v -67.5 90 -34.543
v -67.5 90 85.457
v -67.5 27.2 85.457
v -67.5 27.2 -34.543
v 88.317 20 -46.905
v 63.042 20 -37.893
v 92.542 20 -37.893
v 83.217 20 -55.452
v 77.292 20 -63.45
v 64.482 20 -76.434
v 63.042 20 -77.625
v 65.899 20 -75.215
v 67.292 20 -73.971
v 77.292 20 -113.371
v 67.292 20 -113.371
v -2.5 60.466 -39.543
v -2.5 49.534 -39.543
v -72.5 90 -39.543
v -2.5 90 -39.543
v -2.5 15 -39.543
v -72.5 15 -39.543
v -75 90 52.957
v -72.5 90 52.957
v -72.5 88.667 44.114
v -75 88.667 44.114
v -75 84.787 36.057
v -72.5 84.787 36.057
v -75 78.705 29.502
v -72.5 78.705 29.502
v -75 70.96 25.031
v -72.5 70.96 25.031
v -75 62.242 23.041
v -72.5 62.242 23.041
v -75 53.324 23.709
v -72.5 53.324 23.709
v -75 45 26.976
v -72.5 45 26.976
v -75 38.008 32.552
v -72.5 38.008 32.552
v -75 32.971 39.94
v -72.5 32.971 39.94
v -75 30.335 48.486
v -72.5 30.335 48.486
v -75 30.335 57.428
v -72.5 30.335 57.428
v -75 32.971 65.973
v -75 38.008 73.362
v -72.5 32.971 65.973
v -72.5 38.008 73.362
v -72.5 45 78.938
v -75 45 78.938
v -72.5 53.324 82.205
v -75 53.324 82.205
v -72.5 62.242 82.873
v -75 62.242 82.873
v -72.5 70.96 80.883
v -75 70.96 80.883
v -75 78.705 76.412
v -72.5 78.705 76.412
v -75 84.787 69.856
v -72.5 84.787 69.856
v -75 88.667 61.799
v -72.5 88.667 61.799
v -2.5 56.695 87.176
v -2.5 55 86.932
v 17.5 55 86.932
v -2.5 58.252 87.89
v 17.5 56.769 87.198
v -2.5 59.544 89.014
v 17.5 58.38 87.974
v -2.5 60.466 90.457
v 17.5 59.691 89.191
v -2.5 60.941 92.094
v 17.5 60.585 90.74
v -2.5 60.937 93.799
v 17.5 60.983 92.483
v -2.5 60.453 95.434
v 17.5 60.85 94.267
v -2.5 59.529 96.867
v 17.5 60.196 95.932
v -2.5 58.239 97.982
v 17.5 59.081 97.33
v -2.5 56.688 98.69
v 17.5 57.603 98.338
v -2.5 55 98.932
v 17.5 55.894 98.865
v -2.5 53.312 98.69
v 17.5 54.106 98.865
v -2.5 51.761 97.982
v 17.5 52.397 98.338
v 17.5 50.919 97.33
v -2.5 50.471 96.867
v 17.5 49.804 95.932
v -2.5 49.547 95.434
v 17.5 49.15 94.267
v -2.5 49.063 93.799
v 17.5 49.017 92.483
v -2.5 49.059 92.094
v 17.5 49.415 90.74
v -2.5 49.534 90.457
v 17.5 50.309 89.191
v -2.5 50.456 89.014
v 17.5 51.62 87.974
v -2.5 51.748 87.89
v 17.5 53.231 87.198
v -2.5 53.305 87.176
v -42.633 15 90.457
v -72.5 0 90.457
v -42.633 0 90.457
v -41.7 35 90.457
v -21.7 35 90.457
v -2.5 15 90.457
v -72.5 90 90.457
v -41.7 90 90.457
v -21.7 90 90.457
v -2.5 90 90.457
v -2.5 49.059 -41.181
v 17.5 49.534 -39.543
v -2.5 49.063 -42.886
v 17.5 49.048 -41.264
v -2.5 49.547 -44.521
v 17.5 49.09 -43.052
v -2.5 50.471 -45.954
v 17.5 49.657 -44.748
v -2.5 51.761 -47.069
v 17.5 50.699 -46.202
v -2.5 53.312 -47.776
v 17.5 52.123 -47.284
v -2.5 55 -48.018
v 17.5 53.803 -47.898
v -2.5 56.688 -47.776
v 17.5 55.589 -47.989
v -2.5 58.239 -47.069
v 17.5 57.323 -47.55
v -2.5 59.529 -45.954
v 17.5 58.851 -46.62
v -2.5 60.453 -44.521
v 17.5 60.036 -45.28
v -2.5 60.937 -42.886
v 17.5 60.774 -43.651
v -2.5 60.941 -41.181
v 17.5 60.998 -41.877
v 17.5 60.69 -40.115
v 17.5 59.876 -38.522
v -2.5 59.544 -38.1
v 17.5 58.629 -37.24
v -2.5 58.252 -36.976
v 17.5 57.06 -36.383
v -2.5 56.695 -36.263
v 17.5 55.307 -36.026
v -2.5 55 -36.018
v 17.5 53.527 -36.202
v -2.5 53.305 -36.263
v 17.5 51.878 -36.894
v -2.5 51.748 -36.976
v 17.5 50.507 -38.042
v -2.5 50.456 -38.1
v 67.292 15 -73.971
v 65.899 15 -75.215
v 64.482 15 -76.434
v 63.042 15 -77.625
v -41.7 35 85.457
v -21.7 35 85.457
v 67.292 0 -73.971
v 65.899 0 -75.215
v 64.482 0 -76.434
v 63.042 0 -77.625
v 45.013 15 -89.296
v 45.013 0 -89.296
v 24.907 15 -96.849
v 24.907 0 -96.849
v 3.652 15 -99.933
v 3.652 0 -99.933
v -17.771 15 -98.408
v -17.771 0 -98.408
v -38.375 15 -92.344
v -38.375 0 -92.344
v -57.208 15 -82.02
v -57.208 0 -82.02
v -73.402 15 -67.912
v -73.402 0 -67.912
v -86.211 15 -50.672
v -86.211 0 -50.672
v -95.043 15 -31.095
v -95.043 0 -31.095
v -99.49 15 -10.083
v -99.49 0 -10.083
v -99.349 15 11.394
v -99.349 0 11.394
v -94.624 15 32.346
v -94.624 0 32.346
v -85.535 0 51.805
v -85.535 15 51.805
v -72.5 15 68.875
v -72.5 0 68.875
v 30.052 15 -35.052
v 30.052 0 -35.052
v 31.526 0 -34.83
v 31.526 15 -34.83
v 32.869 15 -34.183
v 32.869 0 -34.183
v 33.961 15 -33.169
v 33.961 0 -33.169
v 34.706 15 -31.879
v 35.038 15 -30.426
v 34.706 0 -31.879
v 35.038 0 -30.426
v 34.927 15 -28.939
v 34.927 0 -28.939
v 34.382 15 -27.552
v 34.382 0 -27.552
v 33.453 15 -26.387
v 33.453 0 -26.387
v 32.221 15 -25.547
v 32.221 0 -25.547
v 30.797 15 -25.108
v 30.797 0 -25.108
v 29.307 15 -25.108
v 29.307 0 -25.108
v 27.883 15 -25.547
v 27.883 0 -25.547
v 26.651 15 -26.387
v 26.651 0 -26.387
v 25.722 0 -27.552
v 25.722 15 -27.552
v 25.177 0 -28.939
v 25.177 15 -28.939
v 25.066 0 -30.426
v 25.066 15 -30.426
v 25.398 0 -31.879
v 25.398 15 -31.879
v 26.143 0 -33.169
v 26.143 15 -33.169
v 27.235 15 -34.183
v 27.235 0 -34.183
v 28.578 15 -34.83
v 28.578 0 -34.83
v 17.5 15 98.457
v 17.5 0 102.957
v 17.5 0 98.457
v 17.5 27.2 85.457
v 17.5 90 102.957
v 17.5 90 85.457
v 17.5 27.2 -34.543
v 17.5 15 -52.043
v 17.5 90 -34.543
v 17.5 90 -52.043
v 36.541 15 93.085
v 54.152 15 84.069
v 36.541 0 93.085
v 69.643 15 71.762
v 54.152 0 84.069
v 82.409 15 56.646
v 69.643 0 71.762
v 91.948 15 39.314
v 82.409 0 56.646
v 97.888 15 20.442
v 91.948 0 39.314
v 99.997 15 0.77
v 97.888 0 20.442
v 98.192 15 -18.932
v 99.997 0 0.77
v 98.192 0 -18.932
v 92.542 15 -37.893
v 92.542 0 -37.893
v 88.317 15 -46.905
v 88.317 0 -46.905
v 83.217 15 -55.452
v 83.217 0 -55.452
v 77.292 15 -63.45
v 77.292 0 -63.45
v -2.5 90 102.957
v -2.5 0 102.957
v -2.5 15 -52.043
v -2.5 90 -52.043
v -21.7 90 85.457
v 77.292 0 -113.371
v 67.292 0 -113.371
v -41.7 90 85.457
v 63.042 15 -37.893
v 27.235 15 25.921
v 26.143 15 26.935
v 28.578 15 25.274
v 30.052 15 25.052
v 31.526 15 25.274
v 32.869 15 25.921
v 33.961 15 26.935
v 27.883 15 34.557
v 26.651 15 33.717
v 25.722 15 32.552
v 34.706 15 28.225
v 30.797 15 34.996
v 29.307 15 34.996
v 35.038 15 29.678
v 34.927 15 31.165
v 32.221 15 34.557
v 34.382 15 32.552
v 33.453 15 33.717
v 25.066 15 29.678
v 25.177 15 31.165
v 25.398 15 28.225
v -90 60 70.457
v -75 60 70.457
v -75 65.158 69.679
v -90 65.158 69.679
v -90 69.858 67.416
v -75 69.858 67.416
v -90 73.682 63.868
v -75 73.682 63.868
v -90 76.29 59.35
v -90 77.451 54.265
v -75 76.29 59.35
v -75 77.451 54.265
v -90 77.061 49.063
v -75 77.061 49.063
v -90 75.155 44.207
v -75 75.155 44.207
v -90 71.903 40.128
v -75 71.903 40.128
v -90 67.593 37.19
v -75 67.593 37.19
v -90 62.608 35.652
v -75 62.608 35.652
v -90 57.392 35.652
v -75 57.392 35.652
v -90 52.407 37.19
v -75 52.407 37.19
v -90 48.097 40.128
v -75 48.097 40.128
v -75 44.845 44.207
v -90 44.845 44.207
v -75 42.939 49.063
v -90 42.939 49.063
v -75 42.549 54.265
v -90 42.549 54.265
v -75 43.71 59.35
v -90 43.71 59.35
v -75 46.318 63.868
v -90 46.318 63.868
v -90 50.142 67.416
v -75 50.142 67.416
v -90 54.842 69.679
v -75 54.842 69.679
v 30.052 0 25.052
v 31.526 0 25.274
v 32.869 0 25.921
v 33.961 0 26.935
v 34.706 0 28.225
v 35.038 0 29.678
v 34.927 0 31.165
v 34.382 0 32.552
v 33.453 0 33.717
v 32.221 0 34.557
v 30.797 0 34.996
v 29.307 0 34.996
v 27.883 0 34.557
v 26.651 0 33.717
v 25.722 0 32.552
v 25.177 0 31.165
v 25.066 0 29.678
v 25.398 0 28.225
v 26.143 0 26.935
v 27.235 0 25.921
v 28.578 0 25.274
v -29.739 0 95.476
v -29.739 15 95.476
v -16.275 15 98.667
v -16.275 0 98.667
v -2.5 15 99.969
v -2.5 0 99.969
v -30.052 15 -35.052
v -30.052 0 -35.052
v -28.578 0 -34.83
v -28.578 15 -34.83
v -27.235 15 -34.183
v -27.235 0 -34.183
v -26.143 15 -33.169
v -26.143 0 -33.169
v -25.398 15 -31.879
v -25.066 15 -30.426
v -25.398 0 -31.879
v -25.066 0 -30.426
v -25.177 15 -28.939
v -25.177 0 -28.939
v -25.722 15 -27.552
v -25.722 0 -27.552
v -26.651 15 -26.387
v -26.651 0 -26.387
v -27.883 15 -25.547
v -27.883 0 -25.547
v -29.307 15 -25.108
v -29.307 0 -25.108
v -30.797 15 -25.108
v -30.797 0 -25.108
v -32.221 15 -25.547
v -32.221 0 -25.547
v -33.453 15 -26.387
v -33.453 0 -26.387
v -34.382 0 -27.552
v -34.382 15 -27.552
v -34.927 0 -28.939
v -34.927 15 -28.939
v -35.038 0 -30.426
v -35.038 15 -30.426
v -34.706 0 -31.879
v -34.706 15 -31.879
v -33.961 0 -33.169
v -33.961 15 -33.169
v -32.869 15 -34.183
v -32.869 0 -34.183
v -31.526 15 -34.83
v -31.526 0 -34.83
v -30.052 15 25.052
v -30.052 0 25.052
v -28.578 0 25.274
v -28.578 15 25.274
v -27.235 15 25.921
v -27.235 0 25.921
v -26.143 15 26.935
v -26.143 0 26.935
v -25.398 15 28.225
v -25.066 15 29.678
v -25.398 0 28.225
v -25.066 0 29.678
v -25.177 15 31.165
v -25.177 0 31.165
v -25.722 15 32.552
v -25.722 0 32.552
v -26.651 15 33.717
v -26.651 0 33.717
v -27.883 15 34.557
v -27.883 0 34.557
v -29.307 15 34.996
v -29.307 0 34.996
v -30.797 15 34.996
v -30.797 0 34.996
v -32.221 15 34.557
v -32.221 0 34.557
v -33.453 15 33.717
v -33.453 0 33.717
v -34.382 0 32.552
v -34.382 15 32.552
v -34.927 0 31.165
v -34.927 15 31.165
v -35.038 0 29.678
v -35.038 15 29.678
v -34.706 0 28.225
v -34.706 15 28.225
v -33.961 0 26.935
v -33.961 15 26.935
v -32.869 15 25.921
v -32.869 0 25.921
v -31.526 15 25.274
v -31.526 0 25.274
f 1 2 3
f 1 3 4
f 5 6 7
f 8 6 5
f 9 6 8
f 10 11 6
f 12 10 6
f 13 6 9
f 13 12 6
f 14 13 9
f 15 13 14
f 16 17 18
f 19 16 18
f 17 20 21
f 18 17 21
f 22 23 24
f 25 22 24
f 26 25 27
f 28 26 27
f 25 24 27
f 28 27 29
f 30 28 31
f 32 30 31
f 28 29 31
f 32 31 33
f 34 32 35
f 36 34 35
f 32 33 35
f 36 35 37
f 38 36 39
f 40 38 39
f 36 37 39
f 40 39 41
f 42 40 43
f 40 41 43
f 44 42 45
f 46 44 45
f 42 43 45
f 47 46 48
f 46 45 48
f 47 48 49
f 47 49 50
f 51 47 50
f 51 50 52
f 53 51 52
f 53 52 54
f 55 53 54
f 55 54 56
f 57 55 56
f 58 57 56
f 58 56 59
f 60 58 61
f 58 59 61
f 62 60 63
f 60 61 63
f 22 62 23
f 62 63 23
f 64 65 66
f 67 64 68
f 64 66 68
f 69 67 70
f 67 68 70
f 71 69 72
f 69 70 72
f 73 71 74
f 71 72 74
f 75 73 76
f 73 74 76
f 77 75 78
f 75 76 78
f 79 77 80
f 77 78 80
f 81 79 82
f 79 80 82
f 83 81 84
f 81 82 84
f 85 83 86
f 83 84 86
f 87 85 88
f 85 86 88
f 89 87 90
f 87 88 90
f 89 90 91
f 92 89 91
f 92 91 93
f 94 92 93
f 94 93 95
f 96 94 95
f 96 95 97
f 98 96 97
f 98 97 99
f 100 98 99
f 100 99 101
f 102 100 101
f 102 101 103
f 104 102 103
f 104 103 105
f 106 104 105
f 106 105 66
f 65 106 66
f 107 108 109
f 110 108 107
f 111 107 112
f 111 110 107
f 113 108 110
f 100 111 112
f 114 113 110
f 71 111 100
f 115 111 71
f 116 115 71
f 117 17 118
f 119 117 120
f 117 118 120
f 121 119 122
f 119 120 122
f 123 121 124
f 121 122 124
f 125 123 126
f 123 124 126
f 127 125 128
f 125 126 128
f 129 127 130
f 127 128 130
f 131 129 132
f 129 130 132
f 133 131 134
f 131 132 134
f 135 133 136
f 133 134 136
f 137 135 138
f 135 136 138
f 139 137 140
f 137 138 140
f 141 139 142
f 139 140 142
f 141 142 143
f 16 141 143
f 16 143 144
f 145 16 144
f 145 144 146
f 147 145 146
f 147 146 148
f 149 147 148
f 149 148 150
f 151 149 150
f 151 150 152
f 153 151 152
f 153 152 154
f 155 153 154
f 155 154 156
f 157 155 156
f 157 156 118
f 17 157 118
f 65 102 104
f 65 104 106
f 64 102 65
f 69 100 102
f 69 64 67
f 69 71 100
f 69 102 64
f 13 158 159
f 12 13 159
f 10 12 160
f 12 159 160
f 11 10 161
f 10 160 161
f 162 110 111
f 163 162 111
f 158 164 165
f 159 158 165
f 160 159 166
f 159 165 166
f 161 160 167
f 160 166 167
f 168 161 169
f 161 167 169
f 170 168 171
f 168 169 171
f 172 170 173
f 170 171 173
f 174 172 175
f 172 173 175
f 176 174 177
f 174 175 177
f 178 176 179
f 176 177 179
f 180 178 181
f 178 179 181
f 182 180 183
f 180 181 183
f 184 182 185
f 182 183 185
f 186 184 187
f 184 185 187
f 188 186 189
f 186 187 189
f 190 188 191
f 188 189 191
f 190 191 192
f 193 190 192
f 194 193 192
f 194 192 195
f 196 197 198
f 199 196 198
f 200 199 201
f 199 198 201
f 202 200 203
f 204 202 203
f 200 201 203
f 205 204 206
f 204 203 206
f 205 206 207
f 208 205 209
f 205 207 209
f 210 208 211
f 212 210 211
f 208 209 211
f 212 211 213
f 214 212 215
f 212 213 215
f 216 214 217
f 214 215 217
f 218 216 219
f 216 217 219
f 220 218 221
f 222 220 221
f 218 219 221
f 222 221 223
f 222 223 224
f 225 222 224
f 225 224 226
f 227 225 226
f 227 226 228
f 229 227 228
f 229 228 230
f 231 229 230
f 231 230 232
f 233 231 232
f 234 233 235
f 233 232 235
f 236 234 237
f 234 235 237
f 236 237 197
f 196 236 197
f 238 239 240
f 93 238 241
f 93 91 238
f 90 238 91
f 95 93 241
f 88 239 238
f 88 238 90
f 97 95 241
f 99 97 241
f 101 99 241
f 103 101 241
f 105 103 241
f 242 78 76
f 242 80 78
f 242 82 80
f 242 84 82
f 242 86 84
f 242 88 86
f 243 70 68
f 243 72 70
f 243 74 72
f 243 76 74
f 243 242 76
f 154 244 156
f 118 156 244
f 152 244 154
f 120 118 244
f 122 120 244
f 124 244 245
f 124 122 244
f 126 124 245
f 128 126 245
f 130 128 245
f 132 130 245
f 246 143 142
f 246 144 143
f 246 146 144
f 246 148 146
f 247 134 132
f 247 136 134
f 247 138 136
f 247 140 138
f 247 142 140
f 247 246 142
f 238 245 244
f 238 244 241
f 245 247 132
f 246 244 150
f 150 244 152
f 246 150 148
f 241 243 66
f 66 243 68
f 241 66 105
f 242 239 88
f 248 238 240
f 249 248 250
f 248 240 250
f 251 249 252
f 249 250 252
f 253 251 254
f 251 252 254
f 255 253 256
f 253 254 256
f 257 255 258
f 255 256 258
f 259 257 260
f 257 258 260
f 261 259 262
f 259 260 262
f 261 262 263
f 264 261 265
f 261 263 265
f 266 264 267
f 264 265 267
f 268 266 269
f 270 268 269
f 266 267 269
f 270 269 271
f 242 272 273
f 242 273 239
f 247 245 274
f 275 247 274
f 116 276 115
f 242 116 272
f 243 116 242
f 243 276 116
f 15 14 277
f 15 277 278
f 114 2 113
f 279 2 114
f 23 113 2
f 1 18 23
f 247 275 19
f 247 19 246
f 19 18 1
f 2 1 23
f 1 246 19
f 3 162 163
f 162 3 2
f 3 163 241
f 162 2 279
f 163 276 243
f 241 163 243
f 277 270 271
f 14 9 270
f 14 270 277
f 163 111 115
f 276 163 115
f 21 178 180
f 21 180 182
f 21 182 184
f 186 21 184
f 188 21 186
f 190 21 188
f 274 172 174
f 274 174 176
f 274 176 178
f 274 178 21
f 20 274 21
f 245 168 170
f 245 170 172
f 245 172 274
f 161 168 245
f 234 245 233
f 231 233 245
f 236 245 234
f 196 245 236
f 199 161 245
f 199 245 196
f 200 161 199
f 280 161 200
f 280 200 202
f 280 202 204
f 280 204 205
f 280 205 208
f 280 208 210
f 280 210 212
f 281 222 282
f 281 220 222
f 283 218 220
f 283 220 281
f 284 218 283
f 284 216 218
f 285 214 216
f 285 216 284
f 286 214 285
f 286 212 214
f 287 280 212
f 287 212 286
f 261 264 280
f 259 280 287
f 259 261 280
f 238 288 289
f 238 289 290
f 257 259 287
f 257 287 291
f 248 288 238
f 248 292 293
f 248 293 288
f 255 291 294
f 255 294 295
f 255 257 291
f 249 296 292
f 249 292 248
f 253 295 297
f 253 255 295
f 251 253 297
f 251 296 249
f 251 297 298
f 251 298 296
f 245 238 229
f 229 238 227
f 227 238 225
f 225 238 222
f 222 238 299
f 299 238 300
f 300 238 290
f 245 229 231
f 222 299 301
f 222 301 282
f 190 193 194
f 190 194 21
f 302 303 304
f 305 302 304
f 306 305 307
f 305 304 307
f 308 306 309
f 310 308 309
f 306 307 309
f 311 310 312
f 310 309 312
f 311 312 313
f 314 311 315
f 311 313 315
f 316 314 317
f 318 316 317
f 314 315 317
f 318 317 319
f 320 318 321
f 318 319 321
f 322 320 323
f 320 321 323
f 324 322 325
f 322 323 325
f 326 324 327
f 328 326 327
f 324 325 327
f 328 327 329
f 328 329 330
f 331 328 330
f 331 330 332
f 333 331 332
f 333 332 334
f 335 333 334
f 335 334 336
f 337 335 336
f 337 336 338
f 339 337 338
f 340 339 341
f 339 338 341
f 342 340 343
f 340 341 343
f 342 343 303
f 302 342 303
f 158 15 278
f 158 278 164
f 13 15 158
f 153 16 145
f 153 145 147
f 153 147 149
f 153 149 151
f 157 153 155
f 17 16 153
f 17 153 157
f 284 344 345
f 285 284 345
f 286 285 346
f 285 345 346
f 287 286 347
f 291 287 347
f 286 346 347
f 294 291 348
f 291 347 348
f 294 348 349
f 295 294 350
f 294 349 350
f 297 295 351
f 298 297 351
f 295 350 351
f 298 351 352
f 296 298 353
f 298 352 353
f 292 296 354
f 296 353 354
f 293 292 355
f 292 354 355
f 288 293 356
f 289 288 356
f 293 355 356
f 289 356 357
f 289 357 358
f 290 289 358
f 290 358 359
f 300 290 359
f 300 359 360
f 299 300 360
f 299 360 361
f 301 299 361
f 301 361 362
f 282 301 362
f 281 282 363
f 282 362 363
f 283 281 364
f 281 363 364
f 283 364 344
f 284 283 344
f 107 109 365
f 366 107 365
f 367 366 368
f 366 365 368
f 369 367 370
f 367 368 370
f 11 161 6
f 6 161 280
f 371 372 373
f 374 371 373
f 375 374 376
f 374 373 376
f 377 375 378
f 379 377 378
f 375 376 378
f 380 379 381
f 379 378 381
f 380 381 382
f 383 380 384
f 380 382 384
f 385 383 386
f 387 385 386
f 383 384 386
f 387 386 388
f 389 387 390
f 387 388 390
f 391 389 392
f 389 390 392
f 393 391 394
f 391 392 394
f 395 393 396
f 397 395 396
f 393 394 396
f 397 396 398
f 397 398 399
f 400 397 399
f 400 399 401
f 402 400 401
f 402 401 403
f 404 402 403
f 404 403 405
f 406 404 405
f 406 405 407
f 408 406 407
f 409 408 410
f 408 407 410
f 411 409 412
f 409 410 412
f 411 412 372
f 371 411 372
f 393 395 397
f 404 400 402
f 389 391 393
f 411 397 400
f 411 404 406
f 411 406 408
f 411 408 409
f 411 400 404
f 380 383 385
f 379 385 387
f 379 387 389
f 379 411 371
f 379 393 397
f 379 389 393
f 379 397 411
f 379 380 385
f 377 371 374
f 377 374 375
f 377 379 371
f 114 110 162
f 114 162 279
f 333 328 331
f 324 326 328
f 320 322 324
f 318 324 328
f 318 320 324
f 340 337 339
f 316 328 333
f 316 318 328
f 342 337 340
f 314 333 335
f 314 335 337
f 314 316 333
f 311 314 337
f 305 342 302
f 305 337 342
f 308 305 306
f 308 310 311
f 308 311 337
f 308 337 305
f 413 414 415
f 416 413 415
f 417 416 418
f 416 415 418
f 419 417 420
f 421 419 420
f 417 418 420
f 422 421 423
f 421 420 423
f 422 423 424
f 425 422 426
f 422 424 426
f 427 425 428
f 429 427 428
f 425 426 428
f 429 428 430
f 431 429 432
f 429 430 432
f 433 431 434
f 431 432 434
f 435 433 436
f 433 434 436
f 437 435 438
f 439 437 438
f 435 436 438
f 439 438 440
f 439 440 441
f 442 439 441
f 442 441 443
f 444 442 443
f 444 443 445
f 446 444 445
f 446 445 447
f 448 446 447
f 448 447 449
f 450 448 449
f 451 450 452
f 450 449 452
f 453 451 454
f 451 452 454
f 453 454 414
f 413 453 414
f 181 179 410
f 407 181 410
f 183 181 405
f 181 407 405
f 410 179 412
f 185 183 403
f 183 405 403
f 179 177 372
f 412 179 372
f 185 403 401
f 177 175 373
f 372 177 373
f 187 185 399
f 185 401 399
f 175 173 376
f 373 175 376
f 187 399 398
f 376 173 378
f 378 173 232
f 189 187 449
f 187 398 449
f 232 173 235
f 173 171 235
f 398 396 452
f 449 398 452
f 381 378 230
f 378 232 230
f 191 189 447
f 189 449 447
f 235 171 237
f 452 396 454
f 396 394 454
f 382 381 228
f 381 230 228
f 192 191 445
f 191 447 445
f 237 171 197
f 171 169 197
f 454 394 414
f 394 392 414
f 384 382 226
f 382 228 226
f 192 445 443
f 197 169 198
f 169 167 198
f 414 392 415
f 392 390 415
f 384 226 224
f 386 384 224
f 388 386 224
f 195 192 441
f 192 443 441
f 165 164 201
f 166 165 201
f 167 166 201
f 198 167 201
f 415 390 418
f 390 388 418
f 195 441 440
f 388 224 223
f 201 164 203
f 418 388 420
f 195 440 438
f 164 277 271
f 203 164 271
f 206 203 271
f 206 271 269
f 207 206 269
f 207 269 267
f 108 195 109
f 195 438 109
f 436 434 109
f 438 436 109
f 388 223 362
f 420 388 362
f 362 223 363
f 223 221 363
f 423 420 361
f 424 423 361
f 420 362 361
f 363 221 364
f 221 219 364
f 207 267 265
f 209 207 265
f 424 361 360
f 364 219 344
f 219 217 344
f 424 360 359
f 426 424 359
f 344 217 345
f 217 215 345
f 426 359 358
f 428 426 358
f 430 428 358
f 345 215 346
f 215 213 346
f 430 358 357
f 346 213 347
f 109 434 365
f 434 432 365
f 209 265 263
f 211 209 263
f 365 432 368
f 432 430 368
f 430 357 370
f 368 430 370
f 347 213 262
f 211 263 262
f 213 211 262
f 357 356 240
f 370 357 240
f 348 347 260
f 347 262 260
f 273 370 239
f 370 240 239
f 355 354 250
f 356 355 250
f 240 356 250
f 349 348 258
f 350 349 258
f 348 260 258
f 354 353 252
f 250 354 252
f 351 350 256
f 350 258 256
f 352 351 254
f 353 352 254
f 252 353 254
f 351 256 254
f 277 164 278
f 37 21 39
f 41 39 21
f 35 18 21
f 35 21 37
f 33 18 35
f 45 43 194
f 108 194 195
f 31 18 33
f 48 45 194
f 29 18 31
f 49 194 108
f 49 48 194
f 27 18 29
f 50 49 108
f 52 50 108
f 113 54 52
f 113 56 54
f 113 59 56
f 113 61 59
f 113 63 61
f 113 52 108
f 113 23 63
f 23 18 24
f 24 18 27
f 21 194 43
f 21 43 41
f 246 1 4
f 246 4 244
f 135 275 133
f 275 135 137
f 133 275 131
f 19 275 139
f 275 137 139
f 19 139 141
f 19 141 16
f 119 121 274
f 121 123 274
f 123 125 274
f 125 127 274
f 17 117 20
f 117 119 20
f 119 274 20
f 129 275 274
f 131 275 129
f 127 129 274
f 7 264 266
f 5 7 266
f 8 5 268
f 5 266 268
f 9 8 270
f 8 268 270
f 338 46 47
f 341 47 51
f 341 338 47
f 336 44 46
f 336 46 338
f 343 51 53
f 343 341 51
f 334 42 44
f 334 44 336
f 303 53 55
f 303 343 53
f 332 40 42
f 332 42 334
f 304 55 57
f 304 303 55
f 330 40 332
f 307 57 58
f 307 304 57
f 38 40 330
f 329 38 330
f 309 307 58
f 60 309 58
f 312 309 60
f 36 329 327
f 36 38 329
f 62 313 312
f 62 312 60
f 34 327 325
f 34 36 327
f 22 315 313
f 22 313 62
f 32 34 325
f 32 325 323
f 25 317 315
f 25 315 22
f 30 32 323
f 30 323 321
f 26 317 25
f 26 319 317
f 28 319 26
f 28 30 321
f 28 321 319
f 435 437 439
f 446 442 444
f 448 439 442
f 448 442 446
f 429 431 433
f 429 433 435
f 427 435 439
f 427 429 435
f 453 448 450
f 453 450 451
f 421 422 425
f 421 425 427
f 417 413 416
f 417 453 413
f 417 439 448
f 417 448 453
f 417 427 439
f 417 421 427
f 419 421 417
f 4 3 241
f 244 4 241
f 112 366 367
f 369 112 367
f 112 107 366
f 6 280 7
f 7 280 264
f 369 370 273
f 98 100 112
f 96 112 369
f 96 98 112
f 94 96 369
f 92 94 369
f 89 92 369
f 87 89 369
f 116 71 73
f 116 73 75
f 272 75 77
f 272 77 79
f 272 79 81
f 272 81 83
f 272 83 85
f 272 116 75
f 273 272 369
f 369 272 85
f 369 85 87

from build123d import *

# Parameters (mm, degrees)
SKETCH1_R                       = 100
BOSS_EXTRUDE1_DEPTH             = 15
BOSS_EXTRUDE2_DEPTH             = 75
BOSS_EXTRUDE2_DIRECTION_2_REACH = 144.215
SKETCH3_W                       = 85
SKETCH3_H                       = 120
CUT_EXTRUDE1_DEPTH              = 62.8
SKETCH4_W                       = 20
SKETCH4_H                       = 55
CUT_EXTRUDE2_DEPTH              = 5
SKETCH5_R                       = 30
BOSS_EXTRUDE3_DEPTH             = 2.5
SKETCH6_R                       = 17.5
BOSS_EXTRUDE4_DEPTH             = 15
BOSS_EXTRUDE5_DEPTH             = 5
BOSS_EXTRUDE5_DIRECTION_2_REACH = 163.942
SKETCH8_R                       = 6
CUT_EXTRUDE3_DEPTH              = 20
SKETCH11_R                      = 5
CUT_EXTRUDE4_DEPTH              = 15


with BuildPart() as part:
    # Sketch1 → Boss-Extrude1 (new body)
    with BuildSketch(Plane(origin=(0, 0, 0), x_dir=(1, 0, 0), z_dir=(0, 1, 0))):
        with Locations(Location((0, 0, 0), (0, 0, 270))):
            Circle(SKETCH1_R)
    extrude(amount=BOSS_EXTRUDE1_DEPTH)

    # Sketch2 → Boss-Extrude2 (add)
    with BuildSketch(Plane(origin=(0, 15, 0), x_dir=(1, 0, 0), z_dir=(0, 1, 0))):
        Polygon((-2.5, 52.043156662), (-2.5, 39.543156662), (-72.5, 39.543156662), (-72.5, -90.456843338), (-2.5, -90.456843338), (-2.5, -102.956843338), (17.5, -102.956843338), (17.5, 52.043156662), align=None)
    extrude(amount=BOSS_EXTRUDE2_DEPTH)

    # Boss-Extrude2 direction 2: up to this face of the body (flat: up to its plane)
    boss_extrude2_direction_2_end = Plane(part.part.faces().sort_by_distance((0, 0, 0))[0])
    # Sketch2 → Boss-Extrude2 direction 2 (add, up to the picked face)
    with BuildSketch(Plane(origin=(0, 15, 0), x_dir=(1, 0, 0), z_dir=(0, 1, 0)), mode=Mode.PRIVATE) as boss_extrude2_direction_2_sk1:
        Polygon((-2.5, 52.043156662), (-2.5, 39.543156662), (-72.5, 39.543156662), (-72.5, -90.456843338), (-2.5, -90.456843338), (-2.5, -102.956843338), (17.5, -102.956843338), (17.5, 52.043156662), align=None)
    boss_extrude2_direction_2_tool1 = split(extrude(boss_extrude2_direction_2_sk1.sketch, amount=-BOSS_EXTRUDE2_DIRECTION_2_REACH, mode=Mode.PRIVATE), bisect_by=boss_extrude2_direction_2_end, keep=Keep.BOTH, mode=Mode.PRIVATE)
    add(boss_extrude2_direction_2_tool1.solids().sort_by(Axis((-26.065574, 15, 25.456843), (0, -1, 0)))[0])

    # Sketch3 → Cut-Extrude1 (cut)
    with BuildSketch(Plane(origin=(0, 90, 0), x_dir=(1, 0, 0), z_dir=(0, 1, 0))):
        with Locations((-25, -25.456843338)):
            Rectangle(SKETCH3_W, SKETCH3_H)
    extrude(amount=-CUT_EXTRUDE1_DEPTH, mode=Mode.SUBTRACT)

    # Sketch4 → Cut-Extrude2 (cut)
    with BuildSketch(Plane.XY.offset(90.456843338)):
        with Locations((-31.7, 62.5)):
            Rectangle(SKETCH4_W, SKETCH4_H)
    extrude(amount=-CUT_EXTRUDE2_DEPTH, mode=Mode.SUBTRACT)

    # Sketch5 → Boss-Extrude3 (add)
    with BuildSketch(Plane.ZY.offset(72.5)):
        with Locations(Location((52.956843338, 60, 0), (0, 0, 90))):
            Circle(SKETCH5_R)
    extrude(amount=BOSS_EXTRUDE3_DEPTH)

    # Sketch6 → Boss-Extrude4 (add)
    with BuildSketch(Plane.ZY.offset(75)):
        with Locations((52.956843338, 60)):
            Circle(SKETCH6_R)
    extrude(amount=BOSS_EXTRUDE4_DEPTH)

    # Sketch7 → Boss-Extrude5 (add)
    with BuildSketch(Plane(origin=(0, 15, 0), x_dir=(1, 0, 0), z_dir=(0, 1, 0))):
        with BuildLine():
            Line((63.042469592, 37.893156662), (92.542469592, 37.893156662))
            ThreePointArc((92.542469592, 37.893156662), (85.873522386, 51.24195696), (77.292469592, 63.449776551))
            Line((77.292469592, 63.449776551), (77.292469592, 113.371099331))
            Line((77.292469592, 113.371099331), (67.292469592, 113.371099331))
            Line((67.292469592, 113.371099331), (67.292469592, 73.971099331))
            ThreePointArc((67.292469592, 73.971099331), (65.19307414, 75.827851639), (63.042469592, 77.625041242))
            Line((63.042469592, 77.625041242), (63.042469592, 37.893156662))
        make_face()
    extrude(amount=BOSS_EXTRUDE5_DEPTH)

    # Boss-Extrude5 direction 2: up to this face of the body (flat: up to its plane)
    boss_extrude5_direction_2_end = Plane(part.part.faces().sort_by_distance((-0.54005377, 0, 0.955561691))[0])
    # Sketch7 → Boss-Extrude5 direction 2 (add, up to the picked face)
    with BuildSketch(Plane(origin=(0, 15, 0), x_dir=(1, 0, 0), z_dir=(0, 1, 0)), mode=Mode.PRIVATE) as boss_extrude5_direction_2_sk1:
        with BuildLine():
            Line((63.042469592, 37.893156662), (92.542469592, 37.893156662))
            ThreePointArc((92.542469592, 37.893156662), (85.873522386, 51.24195696), (77.292469592, 63.449776551))
            Line((77.292469592, 63.449776551), (77.292469592, 113.371099331))
            Line((77.292469592, 113.371099331), (67.292469592, 113.371099331))
            Line((67.292469592, 113.371099331), (67.292469592, 73.971099331))
            ThreePointArc((67.292469592, 73.971099331), (65.19307414, 75.827851639), (63.042469592, 77.625041242))
            Line((63.042469592, 77.625041242), (63.042469592, 37.893156662))
        make_face()
    boss_extrude5_direction_2_tool1 = split(extrude(boss_extrude5_direction_2_sk1.sketch, amount=-BOSS_EXTRUDE5_DIRECTION_2_REACH, mode=Mode.PRIVATE), bisect_by=boss_extrude5_direction_2_end, keep=Keep.BOTH, mode=Mode.PRIVATE)
    add(boss_extrude5_direction_2_tool1.solids().sort_by(Axis((73.261773, 15, -67.454705), (0, -1, 0)))[0])

    # Sketch8 → Cut-Extrude3 (cut)
    with BuildSketch(Plane(origin=(17.5, 0, 0), x_dir=(0, 0, -1), z_dir=(1, 0, 0))):
        with Locations((-92.931843338, 55)):
            Circle(SKETCH8_R)
        with Locations(Location((42.018156662, 55, 0), (0, 0, 245.63802206))):
            Circle(SKETCH8_R)
    extrude(amount=-CUT_EXTRUDE3_DEPTH, mode=Mode.SUBTRACT)

    # Sketch11 → Cut-Extrude4 (cut)
    with BuildSketch(Plane.XZ):
        with Locations(Location((-30.0520382, 30.0520382, 0), (0, 0, 270))):
            Circle(SKETCH11_R)
        with Locations(Location((30.0520382, 30.0520382, 0), (0, 0, 270))):
            Circle(SKETCH11_R)
        with Locations(Location((30.0520382, -30.0520382, 0), (0, 0, 270))):
            Circle(SKETCH11_R)
        with Locations(Location((-30.0520382, -30.0520382, 0), (0, 0, 270))):
            Circle(SKETCH11_R)
    extrude(amount=-CUT_EXTRUDE4_DEPTH, mode=Mode.SUBTRACT)


solid = part.part
